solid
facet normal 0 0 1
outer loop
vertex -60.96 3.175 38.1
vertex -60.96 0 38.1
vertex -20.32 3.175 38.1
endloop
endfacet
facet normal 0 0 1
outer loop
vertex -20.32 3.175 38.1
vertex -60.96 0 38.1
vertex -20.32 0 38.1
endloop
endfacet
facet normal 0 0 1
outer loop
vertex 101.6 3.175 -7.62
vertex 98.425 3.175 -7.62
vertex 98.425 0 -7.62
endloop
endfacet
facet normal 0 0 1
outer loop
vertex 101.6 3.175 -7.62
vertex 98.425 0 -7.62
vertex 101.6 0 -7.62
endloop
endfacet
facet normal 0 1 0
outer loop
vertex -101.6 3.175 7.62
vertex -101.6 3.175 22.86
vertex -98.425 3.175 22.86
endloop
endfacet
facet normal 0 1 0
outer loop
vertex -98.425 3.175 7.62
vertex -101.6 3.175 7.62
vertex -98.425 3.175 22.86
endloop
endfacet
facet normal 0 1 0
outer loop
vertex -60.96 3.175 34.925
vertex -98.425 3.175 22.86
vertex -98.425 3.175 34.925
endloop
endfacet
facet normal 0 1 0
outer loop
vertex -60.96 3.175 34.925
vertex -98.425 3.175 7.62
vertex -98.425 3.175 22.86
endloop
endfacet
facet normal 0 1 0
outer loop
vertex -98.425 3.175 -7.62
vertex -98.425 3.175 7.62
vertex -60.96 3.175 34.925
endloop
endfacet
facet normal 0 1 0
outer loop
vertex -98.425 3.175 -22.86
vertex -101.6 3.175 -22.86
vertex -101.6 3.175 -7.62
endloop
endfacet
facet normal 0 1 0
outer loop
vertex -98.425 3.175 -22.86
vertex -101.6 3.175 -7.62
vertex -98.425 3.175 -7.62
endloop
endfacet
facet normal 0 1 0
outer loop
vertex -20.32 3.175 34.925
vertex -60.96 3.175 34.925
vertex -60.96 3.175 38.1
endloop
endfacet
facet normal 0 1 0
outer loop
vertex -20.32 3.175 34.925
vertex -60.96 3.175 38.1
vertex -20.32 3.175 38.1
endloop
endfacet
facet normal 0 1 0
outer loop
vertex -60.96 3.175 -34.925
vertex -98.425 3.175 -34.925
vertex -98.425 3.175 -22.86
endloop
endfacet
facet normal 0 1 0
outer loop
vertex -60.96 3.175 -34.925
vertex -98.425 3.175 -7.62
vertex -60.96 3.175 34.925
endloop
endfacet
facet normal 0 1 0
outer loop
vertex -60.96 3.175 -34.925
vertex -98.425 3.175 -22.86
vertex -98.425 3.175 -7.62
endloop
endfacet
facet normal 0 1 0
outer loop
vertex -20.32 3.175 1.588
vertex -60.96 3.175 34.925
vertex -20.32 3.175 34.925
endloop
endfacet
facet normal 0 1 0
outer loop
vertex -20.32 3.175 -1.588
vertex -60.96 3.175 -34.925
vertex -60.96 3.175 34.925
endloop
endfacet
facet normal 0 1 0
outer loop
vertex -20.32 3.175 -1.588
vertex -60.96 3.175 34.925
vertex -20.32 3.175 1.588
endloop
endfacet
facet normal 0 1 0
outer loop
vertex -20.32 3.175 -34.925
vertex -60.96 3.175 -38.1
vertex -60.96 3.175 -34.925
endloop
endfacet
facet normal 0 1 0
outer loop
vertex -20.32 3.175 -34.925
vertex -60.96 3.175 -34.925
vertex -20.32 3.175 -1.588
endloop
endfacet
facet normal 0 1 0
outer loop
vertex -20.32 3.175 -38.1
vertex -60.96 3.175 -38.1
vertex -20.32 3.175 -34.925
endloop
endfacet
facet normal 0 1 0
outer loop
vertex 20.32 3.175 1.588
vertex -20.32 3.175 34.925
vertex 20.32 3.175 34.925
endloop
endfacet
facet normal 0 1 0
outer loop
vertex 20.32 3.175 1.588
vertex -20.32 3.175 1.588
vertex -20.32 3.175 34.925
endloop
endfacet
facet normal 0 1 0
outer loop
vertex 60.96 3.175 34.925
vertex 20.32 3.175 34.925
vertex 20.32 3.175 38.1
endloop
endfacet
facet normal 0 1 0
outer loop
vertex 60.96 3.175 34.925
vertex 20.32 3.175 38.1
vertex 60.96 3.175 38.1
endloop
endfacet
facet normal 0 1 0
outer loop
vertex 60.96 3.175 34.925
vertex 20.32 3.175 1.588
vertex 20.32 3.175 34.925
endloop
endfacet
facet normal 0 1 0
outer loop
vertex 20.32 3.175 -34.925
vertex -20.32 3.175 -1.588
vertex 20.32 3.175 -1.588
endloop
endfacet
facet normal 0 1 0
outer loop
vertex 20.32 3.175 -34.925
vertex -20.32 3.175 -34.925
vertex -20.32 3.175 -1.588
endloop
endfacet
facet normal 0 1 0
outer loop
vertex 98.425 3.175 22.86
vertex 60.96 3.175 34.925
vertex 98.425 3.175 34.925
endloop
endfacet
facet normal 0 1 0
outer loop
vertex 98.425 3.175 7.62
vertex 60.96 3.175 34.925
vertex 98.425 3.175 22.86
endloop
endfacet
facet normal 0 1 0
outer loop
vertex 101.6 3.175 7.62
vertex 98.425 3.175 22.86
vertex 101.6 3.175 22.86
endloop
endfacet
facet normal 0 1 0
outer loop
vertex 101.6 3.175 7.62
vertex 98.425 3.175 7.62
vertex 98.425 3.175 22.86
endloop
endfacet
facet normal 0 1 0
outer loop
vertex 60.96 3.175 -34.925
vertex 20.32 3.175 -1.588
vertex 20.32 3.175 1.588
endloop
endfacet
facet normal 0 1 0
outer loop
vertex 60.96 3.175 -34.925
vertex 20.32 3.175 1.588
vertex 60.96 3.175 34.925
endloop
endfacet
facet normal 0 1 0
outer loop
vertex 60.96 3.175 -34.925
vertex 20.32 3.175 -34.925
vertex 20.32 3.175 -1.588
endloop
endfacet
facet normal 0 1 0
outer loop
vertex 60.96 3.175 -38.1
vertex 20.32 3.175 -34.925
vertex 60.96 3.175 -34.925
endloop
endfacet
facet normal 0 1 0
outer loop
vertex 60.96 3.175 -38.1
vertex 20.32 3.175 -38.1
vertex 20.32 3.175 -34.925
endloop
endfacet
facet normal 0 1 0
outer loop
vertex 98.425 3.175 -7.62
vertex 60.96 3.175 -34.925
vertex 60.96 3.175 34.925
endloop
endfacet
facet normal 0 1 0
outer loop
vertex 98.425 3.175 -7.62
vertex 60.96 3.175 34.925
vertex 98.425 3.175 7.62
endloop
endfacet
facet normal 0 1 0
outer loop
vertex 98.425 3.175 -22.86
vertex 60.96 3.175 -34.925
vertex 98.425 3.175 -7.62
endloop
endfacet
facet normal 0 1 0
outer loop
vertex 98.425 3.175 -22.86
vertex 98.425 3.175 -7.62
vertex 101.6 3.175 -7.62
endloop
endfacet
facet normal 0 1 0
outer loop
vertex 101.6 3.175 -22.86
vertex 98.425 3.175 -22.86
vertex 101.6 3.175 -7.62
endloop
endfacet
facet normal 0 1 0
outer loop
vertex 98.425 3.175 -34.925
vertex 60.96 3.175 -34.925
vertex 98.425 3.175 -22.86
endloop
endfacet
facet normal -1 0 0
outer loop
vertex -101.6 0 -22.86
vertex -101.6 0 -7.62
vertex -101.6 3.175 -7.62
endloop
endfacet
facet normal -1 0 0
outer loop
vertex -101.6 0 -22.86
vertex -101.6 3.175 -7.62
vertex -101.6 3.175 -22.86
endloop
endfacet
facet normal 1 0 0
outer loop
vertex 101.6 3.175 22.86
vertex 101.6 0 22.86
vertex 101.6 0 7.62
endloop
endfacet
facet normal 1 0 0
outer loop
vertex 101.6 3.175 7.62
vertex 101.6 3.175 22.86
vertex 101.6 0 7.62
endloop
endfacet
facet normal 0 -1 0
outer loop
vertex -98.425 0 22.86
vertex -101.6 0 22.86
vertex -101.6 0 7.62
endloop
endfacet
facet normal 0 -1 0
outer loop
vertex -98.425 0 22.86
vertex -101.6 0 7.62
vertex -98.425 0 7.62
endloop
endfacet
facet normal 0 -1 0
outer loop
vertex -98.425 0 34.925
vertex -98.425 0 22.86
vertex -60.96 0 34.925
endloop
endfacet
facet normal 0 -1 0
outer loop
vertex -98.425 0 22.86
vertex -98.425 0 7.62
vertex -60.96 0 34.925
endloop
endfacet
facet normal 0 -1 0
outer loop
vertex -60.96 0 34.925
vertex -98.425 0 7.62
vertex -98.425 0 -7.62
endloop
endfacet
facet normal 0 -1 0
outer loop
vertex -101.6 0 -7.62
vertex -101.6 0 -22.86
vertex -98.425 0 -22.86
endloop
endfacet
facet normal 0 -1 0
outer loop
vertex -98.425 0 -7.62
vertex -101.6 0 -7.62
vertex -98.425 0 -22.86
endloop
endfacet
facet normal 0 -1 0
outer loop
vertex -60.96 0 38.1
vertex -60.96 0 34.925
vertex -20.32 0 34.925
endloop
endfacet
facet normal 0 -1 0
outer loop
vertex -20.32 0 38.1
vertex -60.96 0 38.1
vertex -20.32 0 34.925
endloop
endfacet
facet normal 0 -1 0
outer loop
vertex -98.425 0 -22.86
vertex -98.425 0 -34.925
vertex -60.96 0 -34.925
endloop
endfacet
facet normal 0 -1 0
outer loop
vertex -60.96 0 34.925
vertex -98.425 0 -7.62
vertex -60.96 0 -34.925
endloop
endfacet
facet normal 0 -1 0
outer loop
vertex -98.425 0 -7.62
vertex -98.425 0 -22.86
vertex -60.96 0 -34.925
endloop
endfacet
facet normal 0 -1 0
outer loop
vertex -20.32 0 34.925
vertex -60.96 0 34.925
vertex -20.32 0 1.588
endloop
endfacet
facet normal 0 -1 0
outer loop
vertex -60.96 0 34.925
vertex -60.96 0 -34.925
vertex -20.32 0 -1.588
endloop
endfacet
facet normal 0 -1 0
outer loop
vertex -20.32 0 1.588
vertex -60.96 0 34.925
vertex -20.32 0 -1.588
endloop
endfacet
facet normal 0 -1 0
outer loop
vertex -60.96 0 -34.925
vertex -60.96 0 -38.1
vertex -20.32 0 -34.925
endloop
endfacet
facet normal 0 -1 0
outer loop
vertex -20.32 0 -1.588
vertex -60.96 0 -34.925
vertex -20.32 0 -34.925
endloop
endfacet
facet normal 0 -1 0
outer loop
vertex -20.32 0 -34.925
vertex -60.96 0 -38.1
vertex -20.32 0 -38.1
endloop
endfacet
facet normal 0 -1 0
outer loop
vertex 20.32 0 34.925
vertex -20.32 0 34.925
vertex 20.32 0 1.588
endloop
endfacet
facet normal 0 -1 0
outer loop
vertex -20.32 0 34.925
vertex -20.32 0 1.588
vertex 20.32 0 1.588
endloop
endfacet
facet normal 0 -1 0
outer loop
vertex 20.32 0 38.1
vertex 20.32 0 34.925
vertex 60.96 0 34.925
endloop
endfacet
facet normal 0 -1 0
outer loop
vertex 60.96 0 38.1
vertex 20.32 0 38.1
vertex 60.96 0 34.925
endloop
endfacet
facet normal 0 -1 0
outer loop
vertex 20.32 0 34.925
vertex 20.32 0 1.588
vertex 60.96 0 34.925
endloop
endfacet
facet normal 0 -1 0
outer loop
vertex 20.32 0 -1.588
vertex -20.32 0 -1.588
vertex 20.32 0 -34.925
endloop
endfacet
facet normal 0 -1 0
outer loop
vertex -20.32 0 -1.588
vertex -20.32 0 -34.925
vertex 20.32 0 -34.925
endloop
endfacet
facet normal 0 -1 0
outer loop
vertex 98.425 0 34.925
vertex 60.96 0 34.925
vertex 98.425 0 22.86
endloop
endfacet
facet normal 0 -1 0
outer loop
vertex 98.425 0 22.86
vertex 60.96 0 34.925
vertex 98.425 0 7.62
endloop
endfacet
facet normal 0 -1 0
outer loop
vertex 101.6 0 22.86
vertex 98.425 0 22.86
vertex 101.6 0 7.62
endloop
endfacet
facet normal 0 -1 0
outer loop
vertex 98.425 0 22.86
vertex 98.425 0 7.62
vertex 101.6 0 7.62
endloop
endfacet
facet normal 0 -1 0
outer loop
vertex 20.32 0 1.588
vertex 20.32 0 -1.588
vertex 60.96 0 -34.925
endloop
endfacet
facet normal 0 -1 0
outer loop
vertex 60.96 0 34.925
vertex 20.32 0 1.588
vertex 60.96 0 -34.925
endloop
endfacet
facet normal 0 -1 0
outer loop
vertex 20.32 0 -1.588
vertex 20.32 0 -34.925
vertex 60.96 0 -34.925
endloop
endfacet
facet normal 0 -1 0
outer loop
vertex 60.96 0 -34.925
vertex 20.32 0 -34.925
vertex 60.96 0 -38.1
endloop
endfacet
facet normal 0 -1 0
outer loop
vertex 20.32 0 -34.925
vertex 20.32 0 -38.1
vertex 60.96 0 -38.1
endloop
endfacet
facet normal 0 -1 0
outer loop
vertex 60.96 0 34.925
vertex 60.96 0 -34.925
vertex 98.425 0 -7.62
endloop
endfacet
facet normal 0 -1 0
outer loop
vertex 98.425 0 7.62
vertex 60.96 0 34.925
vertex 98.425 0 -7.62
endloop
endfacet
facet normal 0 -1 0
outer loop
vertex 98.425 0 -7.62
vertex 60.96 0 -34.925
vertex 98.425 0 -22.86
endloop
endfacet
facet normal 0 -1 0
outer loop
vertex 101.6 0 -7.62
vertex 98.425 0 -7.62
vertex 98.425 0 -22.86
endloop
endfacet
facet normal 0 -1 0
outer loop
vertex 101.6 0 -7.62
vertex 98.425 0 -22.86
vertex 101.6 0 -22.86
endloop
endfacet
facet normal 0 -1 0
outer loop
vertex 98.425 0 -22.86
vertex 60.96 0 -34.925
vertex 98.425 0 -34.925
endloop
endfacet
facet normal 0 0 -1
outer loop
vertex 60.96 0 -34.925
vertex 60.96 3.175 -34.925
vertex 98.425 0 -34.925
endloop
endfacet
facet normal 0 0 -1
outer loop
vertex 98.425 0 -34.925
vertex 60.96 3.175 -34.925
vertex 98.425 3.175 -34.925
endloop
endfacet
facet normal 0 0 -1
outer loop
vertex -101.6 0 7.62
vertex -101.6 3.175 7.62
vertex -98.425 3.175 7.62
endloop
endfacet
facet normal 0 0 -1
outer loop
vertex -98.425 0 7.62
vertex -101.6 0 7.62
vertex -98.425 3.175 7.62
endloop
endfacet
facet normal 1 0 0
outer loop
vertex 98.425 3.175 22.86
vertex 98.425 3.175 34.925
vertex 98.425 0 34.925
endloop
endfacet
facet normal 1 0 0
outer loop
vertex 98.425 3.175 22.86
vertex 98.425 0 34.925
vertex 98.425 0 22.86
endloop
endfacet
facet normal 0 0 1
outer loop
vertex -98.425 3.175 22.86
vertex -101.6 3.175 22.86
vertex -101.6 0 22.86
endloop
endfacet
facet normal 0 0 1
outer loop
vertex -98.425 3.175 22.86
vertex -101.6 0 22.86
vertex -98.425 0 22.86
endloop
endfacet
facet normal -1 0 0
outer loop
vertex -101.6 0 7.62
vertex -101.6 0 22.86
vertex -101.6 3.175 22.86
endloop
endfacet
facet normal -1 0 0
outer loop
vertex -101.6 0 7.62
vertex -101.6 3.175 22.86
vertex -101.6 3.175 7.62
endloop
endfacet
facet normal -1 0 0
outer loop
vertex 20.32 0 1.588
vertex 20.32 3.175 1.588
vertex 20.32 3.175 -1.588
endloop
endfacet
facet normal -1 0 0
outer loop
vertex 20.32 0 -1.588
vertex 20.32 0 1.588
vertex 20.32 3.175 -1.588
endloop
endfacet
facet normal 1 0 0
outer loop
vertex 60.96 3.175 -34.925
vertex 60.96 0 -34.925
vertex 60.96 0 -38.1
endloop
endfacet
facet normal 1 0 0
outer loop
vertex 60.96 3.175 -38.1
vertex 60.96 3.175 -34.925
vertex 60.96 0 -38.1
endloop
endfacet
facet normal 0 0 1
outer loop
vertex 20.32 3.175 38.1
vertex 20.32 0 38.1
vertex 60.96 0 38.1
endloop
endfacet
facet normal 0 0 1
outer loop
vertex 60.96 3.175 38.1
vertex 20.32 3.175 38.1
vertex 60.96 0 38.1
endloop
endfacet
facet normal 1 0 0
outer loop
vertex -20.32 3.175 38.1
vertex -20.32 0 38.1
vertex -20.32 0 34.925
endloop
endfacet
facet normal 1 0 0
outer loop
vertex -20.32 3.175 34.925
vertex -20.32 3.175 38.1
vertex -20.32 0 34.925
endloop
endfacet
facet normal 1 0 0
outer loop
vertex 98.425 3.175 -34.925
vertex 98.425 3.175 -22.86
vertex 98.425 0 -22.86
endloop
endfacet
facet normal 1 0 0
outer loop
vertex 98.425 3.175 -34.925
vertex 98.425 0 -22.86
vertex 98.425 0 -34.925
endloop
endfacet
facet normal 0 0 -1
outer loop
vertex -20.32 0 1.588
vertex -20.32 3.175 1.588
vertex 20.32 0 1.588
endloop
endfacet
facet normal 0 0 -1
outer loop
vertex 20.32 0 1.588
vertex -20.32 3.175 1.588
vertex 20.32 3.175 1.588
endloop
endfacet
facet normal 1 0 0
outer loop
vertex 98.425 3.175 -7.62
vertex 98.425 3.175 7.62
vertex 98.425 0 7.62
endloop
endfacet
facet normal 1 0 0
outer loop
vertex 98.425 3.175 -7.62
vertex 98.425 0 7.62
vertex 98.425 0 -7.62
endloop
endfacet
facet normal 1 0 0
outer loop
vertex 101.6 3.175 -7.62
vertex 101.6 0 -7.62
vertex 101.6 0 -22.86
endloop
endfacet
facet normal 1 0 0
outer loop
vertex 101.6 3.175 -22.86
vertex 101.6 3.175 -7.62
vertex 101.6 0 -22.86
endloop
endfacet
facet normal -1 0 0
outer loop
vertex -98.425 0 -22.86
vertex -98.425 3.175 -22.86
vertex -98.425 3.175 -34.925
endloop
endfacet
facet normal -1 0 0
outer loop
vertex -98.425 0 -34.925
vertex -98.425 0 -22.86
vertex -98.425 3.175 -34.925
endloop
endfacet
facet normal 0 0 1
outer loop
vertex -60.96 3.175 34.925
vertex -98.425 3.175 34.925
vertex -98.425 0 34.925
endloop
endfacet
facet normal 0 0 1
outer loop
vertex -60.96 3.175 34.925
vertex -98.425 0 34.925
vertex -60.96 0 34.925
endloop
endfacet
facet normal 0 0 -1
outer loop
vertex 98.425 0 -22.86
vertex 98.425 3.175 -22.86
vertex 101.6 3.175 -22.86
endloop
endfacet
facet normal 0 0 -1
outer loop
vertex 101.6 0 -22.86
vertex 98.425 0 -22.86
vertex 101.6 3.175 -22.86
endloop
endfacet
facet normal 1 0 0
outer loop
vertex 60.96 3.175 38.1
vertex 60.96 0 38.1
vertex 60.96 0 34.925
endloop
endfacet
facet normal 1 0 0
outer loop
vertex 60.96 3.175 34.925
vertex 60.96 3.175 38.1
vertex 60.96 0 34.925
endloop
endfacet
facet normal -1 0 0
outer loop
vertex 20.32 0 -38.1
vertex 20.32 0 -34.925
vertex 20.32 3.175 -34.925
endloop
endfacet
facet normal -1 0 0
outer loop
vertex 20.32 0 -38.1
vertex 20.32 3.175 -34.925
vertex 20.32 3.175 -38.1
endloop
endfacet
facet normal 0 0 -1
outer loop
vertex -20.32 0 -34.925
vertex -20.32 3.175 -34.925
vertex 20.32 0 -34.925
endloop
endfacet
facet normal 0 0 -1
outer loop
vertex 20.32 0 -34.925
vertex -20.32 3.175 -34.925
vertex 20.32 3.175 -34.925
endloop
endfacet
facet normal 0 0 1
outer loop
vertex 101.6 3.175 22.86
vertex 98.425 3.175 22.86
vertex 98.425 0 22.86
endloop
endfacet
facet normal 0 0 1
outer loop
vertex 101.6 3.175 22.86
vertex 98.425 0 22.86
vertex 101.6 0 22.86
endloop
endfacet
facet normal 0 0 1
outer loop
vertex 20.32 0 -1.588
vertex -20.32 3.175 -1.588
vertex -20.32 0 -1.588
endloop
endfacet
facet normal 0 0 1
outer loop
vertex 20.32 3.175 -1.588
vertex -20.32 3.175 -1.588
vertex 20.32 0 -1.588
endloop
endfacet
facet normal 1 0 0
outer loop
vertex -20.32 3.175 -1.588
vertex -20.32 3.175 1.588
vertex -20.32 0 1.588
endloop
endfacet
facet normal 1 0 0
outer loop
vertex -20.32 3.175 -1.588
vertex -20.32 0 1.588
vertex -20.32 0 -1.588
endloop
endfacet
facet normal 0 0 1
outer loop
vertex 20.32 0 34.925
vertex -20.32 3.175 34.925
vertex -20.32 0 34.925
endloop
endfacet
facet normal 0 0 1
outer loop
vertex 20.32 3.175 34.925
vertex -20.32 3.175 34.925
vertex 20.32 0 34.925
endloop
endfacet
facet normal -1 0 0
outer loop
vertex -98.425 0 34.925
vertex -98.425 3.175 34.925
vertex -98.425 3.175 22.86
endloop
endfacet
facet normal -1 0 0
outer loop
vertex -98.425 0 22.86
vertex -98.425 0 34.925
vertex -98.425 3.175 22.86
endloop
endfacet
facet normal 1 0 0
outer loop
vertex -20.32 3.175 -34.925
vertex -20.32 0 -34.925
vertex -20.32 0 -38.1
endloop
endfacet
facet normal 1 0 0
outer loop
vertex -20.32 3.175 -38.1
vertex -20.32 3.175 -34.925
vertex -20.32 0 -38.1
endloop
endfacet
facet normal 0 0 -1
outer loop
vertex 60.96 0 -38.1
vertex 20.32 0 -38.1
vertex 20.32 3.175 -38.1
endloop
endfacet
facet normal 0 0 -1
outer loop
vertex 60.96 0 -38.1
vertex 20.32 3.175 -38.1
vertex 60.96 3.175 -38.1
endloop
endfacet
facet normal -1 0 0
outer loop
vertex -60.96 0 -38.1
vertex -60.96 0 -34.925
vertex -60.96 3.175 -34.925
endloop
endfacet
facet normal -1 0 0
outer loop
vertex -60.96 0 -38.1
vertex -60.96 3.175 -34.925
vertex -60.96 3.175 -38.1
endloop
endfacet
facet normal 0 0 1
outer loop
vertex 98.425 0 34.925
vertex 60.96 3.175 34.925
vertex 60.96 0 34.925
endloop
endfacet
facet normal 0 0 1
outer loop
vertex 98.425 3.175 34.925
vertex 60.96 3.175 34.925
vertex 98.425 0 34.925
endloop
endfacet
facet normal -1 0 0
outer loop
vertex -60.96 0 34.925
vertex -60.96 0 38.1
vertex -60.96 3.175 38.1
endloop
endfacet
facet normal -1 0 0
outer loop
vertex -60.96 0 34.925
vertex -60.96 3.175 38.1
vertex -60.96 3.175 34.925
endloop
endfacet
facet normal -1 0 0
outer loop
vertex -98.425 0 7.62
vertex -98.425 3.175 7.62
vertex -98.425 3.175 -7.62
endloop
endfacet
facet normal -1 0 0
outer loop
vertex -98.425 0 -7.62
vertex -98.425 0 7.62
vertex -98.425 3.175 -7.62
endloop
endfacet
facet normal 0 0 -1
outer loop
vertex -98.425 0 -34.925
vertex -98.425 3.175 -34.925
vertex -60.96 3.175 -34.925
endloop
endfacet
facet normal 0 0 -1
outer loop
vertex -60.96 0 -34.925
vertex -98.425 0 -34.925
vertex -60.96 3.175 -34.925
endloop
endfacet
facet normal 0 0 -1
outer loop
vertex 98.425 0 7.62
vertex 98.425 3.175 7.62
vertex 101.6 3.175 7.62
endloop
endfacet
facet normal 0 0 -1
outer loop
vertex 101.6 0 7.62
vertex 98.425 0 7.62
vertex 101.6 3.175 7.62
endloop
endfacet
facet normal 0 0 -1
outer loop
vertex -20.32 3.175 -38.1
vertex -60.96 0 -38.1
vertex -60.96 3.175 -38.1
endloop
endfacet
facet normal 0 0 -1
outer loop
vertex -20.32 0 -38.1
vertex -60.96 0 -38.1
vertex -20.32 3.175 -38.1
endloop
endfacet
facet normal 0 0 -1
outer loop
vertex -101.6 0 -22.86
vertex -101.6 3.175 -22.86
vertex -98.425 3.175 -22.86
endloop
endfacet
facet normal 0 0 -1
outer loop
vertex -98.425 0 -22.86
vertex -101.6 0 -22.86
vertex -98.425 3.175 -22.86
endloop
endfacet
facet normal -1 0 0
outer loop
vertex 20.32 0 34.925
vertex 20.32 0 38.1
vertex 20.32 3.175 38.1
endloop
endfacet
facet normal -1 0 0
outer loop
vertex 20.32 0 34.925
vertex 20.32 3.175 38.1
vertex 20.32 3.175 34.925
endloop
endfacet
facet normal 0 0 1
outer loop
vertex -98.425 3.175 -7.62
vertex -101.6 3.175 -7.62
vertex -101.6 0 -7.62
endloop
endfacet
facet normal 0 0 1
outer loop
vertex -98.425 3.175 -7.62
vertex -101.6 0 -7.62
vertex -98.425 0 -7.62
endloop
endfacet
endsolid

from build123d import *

# Parameters (mm, degrees)
SKETCH1_W           = 203.2
SKETCH1_H           = 76.2
BOSS_EXTRUDE1_DEPTH = 3.175
SKETCH2_W           = 40.64
SKETCH2_H           = 3.175
CUT_EXTRUDE1_DEPTH  = 3.175
LPATTERN1_COUNT     = 3
LPATTERN1_PITCH     = 81.28
SKETCH3_W           = 3.175
SKETCH3_H           = 15.24
CUT_EXTRUDE2_DEPTH  = 3.175
LPATTERN2_COUNT     = 3
LPATTERN2_PITCH     = 30.48
SKETCH4_W           = 40.64
SKETCH4_H           = 3.175
CUT_EXTRUDE3_DEPTH  = 3.175


with BuildPart() as part:
    # Sketch1 → Boss-Extrude1 (new body)
    with BuildSketch(Plane(origin=(0, 0, 0), x_dir=(1, 0, 0), z_dir=(0, 1, 0))):
        Rectangle(SKETCH1_W, SKETCH1_H)
    extrude(amount=BOSS_EXTRUDE1_DEPTH)

    # Sketch2 → Cut-Extrude1 (cut)
    with BuildSketch(Plane(origin=(0, 3.175, 0), x_dir=(1, 0, 0), z_dir=(0, 1, 0))):
        with Locations((-81.28, 36.5125)):
            Rectangle(SKETCH2_W, SKETCH2_H)
        with Locations((-81.28, -36.5125)):
            Rectangle(SKETCH2_W, SKETCH2_H)
    cut_extrude1 = extrude(amount=-CUT_EXTRUDE1_DEPTH, mode=Mode.SUBTRACT)

    # LPattern1: Cut-Extrude1 ×3
    with Locations(*[(i * LPATTERN1_PITCH, 0, 0) for i in range(1, LPATTERN1_COUNT)]):
        add(cut_extrude1, mode=Mode.SUBTRACT)

    # Sketch3 → Cut-Extrude2 (cut)
    with BuildSketch(Plane(origin=(0, 3.175, 0), x_dir=(1, 0, 0), z_dir=(0, 1, 0))):
        with Locations((100.0125, 30.48)):
            Rectangle(SKETCH3_W, SKETCH3_H)
        with Locations((-100.0125, 30.48)):
            Rectangle(SKETCH3_W, SKETCH3_H)
    cut_extrude2 = extrude(amount=-CUT_EXTRUDE2_DEPTH, mode=Mode.SUBTRACT)

    # LPattern2: Cut-Extrude2 ×3
    with Locations(*[(0, 0, i * LPATTERN2_PITCH) for i in range(1, LPATTERN2_COUNT)]):
        add(cut_extrude2, mode=Mode.SUBTRACT)

    # Sketch4 → Cut-Extrude3 (cut)
    with BuildSketch(Plane(origin=(0, 3.175, 0), x_dir=(1, 0, 0), z_dir=(0, 1, 0))):
        Rectangle(SKETCH4_W, SKETCH4_H)
    extrude(amount=-CUT_EXTRUDE3_DEPTH, mode=Mode.SUBTRACT)


solid = part.part
